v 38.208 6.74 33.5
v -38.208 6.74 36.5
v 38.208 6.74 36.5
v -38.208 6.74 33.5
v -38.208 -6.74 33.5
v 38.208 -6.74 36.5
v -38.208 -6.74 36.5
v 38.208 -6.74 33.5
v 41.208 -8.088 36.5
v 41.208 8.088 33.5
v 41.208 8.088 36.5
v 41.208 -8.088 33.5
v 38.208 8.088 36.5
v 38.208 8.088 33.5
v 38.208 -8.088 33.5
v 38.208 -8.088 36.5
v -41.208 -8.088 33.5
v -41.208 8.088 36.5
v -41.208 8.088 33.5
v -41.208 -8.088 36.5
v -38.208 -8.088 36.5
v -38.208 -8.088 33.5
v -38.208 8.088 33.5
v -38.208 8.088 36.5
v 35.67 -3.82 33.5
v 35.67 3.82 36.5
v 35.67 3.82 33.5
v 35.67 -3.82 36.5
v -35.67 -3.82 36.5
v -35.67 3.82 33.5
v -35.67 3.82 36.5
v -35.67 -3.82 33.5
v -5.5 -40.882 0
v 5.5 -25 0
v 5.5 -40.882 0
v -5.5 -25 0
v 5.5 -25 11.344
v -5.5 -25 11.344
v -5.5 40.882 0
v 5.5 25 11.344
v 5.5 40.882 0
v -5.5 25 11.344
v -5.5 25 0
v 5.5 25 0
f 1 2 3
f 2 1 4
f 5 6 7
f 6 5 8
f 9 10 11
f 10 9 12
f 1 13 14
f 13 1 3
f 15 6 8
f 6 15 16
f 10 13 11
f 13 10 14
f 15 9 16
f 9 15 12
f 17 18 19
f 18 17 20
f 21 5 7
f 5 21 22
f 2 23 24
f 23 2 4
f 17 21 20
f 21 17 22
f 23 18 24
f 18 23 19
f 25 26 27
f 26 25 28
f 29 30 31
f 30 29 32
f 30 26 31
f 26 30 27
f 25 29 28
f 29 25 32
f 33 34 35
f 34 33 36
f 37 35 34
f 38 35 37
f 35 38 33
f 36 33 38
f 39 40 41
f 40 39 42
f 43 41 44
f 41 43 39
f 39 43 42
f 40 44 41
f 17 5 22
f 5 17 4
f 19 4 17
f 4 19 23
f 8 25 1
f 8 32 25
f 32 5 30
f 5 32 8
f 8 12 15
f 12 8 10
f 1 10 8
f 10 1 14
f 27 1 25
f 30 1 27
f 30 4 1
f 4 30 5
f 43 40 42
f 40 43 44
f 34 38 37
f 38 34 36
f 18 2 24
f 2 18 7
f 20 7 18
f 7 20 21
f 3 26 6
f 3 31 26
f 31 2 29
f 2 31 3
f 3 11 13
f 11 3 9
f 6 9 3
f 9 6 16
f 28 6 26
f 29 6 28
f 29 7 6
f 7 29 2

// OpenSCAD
// file: ScrewMount.scad
include <MakerBotSettings.scad>
// Screw Mounts
width = 40;
height = 15;
res=20; // Cylinder resolution
screw_offset_x = .35 * width;
screw_offset_y = .25 * height;
screw_radius = 1.25 + global_correction;
screw_height = 3;
module ScrewMount(x,y,z) {
	translate( [x,y,z] )
		rotate( 90 ) // Rotate for placement
		// Subtract screw holes from base
		difference()  {
			// Draw base
			cube( [width,height,3], center = true );
			// Draw screw holes
			Screw(screw_offset_x, screw_offset_y, 0);
			Screw(-1 * screw_offset_x, screw_offset_y, 0);
			Screw(-1 * screw_offset_x, -1 * screw_offset_y, 0);
			Screw(screw_offset_x, -1 * screw_offset_y, 0);
		}
}
module Screw(x,y,z) {
	translate( [x,y,z] )
		cylinder( screw_height, screw_radius, screw_radius, $fn=res, center = true );
}
ScrewMount(0,0,0);
// file: MakerBotSettings.scad
// Printer settings
extruder_width = 0.4;
global_correction = 0.04 + 2*extruder_width;
// file: PhoneMount.scad
/**
 * Filename: PhoneMount.scad
 * Description: Bracket designed to mount a Samsung Galaxy S6 onto a tiny
 *              mobile robot
 */
include <MakerBotSettings.scad>
use <ScrewMount.scad>;




// Dimensions
phone_width = 70.5   + global_correction;
phone_depth = 6.8    + global_correction;
phone_height = 143.4 + global_correction;

casing_wiggle = 5 + global_correction;
casing_depth = phone_depth + casing_wiggle; 
casing_width = phone_width + casing_wiggle + global_correction; 
casing_height = phone_height * .3 + global_correction;

screw_mount_placement =  ( .95 * phone_width ) / 2;

FullStand();

// Uncomment the below line to get the 2d projection
//projection( cut=true)
module FullStand() {
	union() {
		// Draw primary stand
		//rotate(90) 
		//BaseStation();
		BaseStation();

		// Draw triangular supports
		Support();
		rotate(180)
			Support();

		// Draw vertical supports
		translate( [.8*casing_width/2,0,0] ) 
			HorizontalSupport();
		translate( [-.8*casing_width/2,0,0] )
			rotate(180)
			HorizontalSupport();

		// Draw the phone case itself
		translate( [0,0, 40 ] ) {  
			DrawCase();  
		}
	}
}

//translate( [0,0,80] )
//DrawPhone();

// Tringular Support
module Support( l=11,w=35,h=25) {
	translate( [ 0,  -.69 * screw_mount_placement, 0 ] )
		prism(l,w,h);
}

module VerticalSupport( height=1 ) {
	width = casing_depth * 1.2;
	translate( [7,width/-2,0] )
		cube( [3,width,height]);
}

module HorizontalSupport(height=10) {
	VerticalSupport(casing_height*2);
	translate([0,0,height])
		cube([20,casing_depth ,height*2], center=true);
}

module BaseStation() {
	union () {
		difference() {
		cube( [screw_mount_placement * 2, casing_depth, 3] , center=true);
		scale([.63,1,1])
		cube( [screw_mount_placement * 2, casing_depth, 3] , center=true);
		}
		ScrewMount( screw_mount_placement,0,0);
		ScrewMount( -1 * screw_mount_placement,0,0);
	}
}


module DrawPhone( v = [0,0,0], s=1) {
	translate(v)
		cube( [s*phone_width , s*phone_depth, s*phone_height ], center = true );
}

module DrawCase() {
	y_off = 60;
	difference() {
		rotate(90)
			cube( [ casing_depth, casing_width, casing_height  ], center = true );
		DrawPhone([0,0,y_off]);
		DrawPhone([0,5,y_off], s=.8);
		DrawPhone([0,-5,y_off], s=.55);
		DrawPhone([0,0,-30], s=.5);

	}

}





module prism(l, w, h){
	translate([ -1 * l/2, -1 *  w/2,0])
		polyhedron(
				points=[[0,0,0], [l,0,0], [l,w,0], [0,w,0], [0,w,h], [l,w,h]],
				faces=[[0,1,2,3],[5,4,3,2],[0,4,5,1],[0,3,4],[5,2,1]]
			  );


}
// main file
use <PhoneMount.scad>;

cut_dim = [100,50,67];
difference() {
	FullStand();
	cube( cut_dim, true );
	translate( [0,0,70] )
	cube( cut_dim, true );
}
